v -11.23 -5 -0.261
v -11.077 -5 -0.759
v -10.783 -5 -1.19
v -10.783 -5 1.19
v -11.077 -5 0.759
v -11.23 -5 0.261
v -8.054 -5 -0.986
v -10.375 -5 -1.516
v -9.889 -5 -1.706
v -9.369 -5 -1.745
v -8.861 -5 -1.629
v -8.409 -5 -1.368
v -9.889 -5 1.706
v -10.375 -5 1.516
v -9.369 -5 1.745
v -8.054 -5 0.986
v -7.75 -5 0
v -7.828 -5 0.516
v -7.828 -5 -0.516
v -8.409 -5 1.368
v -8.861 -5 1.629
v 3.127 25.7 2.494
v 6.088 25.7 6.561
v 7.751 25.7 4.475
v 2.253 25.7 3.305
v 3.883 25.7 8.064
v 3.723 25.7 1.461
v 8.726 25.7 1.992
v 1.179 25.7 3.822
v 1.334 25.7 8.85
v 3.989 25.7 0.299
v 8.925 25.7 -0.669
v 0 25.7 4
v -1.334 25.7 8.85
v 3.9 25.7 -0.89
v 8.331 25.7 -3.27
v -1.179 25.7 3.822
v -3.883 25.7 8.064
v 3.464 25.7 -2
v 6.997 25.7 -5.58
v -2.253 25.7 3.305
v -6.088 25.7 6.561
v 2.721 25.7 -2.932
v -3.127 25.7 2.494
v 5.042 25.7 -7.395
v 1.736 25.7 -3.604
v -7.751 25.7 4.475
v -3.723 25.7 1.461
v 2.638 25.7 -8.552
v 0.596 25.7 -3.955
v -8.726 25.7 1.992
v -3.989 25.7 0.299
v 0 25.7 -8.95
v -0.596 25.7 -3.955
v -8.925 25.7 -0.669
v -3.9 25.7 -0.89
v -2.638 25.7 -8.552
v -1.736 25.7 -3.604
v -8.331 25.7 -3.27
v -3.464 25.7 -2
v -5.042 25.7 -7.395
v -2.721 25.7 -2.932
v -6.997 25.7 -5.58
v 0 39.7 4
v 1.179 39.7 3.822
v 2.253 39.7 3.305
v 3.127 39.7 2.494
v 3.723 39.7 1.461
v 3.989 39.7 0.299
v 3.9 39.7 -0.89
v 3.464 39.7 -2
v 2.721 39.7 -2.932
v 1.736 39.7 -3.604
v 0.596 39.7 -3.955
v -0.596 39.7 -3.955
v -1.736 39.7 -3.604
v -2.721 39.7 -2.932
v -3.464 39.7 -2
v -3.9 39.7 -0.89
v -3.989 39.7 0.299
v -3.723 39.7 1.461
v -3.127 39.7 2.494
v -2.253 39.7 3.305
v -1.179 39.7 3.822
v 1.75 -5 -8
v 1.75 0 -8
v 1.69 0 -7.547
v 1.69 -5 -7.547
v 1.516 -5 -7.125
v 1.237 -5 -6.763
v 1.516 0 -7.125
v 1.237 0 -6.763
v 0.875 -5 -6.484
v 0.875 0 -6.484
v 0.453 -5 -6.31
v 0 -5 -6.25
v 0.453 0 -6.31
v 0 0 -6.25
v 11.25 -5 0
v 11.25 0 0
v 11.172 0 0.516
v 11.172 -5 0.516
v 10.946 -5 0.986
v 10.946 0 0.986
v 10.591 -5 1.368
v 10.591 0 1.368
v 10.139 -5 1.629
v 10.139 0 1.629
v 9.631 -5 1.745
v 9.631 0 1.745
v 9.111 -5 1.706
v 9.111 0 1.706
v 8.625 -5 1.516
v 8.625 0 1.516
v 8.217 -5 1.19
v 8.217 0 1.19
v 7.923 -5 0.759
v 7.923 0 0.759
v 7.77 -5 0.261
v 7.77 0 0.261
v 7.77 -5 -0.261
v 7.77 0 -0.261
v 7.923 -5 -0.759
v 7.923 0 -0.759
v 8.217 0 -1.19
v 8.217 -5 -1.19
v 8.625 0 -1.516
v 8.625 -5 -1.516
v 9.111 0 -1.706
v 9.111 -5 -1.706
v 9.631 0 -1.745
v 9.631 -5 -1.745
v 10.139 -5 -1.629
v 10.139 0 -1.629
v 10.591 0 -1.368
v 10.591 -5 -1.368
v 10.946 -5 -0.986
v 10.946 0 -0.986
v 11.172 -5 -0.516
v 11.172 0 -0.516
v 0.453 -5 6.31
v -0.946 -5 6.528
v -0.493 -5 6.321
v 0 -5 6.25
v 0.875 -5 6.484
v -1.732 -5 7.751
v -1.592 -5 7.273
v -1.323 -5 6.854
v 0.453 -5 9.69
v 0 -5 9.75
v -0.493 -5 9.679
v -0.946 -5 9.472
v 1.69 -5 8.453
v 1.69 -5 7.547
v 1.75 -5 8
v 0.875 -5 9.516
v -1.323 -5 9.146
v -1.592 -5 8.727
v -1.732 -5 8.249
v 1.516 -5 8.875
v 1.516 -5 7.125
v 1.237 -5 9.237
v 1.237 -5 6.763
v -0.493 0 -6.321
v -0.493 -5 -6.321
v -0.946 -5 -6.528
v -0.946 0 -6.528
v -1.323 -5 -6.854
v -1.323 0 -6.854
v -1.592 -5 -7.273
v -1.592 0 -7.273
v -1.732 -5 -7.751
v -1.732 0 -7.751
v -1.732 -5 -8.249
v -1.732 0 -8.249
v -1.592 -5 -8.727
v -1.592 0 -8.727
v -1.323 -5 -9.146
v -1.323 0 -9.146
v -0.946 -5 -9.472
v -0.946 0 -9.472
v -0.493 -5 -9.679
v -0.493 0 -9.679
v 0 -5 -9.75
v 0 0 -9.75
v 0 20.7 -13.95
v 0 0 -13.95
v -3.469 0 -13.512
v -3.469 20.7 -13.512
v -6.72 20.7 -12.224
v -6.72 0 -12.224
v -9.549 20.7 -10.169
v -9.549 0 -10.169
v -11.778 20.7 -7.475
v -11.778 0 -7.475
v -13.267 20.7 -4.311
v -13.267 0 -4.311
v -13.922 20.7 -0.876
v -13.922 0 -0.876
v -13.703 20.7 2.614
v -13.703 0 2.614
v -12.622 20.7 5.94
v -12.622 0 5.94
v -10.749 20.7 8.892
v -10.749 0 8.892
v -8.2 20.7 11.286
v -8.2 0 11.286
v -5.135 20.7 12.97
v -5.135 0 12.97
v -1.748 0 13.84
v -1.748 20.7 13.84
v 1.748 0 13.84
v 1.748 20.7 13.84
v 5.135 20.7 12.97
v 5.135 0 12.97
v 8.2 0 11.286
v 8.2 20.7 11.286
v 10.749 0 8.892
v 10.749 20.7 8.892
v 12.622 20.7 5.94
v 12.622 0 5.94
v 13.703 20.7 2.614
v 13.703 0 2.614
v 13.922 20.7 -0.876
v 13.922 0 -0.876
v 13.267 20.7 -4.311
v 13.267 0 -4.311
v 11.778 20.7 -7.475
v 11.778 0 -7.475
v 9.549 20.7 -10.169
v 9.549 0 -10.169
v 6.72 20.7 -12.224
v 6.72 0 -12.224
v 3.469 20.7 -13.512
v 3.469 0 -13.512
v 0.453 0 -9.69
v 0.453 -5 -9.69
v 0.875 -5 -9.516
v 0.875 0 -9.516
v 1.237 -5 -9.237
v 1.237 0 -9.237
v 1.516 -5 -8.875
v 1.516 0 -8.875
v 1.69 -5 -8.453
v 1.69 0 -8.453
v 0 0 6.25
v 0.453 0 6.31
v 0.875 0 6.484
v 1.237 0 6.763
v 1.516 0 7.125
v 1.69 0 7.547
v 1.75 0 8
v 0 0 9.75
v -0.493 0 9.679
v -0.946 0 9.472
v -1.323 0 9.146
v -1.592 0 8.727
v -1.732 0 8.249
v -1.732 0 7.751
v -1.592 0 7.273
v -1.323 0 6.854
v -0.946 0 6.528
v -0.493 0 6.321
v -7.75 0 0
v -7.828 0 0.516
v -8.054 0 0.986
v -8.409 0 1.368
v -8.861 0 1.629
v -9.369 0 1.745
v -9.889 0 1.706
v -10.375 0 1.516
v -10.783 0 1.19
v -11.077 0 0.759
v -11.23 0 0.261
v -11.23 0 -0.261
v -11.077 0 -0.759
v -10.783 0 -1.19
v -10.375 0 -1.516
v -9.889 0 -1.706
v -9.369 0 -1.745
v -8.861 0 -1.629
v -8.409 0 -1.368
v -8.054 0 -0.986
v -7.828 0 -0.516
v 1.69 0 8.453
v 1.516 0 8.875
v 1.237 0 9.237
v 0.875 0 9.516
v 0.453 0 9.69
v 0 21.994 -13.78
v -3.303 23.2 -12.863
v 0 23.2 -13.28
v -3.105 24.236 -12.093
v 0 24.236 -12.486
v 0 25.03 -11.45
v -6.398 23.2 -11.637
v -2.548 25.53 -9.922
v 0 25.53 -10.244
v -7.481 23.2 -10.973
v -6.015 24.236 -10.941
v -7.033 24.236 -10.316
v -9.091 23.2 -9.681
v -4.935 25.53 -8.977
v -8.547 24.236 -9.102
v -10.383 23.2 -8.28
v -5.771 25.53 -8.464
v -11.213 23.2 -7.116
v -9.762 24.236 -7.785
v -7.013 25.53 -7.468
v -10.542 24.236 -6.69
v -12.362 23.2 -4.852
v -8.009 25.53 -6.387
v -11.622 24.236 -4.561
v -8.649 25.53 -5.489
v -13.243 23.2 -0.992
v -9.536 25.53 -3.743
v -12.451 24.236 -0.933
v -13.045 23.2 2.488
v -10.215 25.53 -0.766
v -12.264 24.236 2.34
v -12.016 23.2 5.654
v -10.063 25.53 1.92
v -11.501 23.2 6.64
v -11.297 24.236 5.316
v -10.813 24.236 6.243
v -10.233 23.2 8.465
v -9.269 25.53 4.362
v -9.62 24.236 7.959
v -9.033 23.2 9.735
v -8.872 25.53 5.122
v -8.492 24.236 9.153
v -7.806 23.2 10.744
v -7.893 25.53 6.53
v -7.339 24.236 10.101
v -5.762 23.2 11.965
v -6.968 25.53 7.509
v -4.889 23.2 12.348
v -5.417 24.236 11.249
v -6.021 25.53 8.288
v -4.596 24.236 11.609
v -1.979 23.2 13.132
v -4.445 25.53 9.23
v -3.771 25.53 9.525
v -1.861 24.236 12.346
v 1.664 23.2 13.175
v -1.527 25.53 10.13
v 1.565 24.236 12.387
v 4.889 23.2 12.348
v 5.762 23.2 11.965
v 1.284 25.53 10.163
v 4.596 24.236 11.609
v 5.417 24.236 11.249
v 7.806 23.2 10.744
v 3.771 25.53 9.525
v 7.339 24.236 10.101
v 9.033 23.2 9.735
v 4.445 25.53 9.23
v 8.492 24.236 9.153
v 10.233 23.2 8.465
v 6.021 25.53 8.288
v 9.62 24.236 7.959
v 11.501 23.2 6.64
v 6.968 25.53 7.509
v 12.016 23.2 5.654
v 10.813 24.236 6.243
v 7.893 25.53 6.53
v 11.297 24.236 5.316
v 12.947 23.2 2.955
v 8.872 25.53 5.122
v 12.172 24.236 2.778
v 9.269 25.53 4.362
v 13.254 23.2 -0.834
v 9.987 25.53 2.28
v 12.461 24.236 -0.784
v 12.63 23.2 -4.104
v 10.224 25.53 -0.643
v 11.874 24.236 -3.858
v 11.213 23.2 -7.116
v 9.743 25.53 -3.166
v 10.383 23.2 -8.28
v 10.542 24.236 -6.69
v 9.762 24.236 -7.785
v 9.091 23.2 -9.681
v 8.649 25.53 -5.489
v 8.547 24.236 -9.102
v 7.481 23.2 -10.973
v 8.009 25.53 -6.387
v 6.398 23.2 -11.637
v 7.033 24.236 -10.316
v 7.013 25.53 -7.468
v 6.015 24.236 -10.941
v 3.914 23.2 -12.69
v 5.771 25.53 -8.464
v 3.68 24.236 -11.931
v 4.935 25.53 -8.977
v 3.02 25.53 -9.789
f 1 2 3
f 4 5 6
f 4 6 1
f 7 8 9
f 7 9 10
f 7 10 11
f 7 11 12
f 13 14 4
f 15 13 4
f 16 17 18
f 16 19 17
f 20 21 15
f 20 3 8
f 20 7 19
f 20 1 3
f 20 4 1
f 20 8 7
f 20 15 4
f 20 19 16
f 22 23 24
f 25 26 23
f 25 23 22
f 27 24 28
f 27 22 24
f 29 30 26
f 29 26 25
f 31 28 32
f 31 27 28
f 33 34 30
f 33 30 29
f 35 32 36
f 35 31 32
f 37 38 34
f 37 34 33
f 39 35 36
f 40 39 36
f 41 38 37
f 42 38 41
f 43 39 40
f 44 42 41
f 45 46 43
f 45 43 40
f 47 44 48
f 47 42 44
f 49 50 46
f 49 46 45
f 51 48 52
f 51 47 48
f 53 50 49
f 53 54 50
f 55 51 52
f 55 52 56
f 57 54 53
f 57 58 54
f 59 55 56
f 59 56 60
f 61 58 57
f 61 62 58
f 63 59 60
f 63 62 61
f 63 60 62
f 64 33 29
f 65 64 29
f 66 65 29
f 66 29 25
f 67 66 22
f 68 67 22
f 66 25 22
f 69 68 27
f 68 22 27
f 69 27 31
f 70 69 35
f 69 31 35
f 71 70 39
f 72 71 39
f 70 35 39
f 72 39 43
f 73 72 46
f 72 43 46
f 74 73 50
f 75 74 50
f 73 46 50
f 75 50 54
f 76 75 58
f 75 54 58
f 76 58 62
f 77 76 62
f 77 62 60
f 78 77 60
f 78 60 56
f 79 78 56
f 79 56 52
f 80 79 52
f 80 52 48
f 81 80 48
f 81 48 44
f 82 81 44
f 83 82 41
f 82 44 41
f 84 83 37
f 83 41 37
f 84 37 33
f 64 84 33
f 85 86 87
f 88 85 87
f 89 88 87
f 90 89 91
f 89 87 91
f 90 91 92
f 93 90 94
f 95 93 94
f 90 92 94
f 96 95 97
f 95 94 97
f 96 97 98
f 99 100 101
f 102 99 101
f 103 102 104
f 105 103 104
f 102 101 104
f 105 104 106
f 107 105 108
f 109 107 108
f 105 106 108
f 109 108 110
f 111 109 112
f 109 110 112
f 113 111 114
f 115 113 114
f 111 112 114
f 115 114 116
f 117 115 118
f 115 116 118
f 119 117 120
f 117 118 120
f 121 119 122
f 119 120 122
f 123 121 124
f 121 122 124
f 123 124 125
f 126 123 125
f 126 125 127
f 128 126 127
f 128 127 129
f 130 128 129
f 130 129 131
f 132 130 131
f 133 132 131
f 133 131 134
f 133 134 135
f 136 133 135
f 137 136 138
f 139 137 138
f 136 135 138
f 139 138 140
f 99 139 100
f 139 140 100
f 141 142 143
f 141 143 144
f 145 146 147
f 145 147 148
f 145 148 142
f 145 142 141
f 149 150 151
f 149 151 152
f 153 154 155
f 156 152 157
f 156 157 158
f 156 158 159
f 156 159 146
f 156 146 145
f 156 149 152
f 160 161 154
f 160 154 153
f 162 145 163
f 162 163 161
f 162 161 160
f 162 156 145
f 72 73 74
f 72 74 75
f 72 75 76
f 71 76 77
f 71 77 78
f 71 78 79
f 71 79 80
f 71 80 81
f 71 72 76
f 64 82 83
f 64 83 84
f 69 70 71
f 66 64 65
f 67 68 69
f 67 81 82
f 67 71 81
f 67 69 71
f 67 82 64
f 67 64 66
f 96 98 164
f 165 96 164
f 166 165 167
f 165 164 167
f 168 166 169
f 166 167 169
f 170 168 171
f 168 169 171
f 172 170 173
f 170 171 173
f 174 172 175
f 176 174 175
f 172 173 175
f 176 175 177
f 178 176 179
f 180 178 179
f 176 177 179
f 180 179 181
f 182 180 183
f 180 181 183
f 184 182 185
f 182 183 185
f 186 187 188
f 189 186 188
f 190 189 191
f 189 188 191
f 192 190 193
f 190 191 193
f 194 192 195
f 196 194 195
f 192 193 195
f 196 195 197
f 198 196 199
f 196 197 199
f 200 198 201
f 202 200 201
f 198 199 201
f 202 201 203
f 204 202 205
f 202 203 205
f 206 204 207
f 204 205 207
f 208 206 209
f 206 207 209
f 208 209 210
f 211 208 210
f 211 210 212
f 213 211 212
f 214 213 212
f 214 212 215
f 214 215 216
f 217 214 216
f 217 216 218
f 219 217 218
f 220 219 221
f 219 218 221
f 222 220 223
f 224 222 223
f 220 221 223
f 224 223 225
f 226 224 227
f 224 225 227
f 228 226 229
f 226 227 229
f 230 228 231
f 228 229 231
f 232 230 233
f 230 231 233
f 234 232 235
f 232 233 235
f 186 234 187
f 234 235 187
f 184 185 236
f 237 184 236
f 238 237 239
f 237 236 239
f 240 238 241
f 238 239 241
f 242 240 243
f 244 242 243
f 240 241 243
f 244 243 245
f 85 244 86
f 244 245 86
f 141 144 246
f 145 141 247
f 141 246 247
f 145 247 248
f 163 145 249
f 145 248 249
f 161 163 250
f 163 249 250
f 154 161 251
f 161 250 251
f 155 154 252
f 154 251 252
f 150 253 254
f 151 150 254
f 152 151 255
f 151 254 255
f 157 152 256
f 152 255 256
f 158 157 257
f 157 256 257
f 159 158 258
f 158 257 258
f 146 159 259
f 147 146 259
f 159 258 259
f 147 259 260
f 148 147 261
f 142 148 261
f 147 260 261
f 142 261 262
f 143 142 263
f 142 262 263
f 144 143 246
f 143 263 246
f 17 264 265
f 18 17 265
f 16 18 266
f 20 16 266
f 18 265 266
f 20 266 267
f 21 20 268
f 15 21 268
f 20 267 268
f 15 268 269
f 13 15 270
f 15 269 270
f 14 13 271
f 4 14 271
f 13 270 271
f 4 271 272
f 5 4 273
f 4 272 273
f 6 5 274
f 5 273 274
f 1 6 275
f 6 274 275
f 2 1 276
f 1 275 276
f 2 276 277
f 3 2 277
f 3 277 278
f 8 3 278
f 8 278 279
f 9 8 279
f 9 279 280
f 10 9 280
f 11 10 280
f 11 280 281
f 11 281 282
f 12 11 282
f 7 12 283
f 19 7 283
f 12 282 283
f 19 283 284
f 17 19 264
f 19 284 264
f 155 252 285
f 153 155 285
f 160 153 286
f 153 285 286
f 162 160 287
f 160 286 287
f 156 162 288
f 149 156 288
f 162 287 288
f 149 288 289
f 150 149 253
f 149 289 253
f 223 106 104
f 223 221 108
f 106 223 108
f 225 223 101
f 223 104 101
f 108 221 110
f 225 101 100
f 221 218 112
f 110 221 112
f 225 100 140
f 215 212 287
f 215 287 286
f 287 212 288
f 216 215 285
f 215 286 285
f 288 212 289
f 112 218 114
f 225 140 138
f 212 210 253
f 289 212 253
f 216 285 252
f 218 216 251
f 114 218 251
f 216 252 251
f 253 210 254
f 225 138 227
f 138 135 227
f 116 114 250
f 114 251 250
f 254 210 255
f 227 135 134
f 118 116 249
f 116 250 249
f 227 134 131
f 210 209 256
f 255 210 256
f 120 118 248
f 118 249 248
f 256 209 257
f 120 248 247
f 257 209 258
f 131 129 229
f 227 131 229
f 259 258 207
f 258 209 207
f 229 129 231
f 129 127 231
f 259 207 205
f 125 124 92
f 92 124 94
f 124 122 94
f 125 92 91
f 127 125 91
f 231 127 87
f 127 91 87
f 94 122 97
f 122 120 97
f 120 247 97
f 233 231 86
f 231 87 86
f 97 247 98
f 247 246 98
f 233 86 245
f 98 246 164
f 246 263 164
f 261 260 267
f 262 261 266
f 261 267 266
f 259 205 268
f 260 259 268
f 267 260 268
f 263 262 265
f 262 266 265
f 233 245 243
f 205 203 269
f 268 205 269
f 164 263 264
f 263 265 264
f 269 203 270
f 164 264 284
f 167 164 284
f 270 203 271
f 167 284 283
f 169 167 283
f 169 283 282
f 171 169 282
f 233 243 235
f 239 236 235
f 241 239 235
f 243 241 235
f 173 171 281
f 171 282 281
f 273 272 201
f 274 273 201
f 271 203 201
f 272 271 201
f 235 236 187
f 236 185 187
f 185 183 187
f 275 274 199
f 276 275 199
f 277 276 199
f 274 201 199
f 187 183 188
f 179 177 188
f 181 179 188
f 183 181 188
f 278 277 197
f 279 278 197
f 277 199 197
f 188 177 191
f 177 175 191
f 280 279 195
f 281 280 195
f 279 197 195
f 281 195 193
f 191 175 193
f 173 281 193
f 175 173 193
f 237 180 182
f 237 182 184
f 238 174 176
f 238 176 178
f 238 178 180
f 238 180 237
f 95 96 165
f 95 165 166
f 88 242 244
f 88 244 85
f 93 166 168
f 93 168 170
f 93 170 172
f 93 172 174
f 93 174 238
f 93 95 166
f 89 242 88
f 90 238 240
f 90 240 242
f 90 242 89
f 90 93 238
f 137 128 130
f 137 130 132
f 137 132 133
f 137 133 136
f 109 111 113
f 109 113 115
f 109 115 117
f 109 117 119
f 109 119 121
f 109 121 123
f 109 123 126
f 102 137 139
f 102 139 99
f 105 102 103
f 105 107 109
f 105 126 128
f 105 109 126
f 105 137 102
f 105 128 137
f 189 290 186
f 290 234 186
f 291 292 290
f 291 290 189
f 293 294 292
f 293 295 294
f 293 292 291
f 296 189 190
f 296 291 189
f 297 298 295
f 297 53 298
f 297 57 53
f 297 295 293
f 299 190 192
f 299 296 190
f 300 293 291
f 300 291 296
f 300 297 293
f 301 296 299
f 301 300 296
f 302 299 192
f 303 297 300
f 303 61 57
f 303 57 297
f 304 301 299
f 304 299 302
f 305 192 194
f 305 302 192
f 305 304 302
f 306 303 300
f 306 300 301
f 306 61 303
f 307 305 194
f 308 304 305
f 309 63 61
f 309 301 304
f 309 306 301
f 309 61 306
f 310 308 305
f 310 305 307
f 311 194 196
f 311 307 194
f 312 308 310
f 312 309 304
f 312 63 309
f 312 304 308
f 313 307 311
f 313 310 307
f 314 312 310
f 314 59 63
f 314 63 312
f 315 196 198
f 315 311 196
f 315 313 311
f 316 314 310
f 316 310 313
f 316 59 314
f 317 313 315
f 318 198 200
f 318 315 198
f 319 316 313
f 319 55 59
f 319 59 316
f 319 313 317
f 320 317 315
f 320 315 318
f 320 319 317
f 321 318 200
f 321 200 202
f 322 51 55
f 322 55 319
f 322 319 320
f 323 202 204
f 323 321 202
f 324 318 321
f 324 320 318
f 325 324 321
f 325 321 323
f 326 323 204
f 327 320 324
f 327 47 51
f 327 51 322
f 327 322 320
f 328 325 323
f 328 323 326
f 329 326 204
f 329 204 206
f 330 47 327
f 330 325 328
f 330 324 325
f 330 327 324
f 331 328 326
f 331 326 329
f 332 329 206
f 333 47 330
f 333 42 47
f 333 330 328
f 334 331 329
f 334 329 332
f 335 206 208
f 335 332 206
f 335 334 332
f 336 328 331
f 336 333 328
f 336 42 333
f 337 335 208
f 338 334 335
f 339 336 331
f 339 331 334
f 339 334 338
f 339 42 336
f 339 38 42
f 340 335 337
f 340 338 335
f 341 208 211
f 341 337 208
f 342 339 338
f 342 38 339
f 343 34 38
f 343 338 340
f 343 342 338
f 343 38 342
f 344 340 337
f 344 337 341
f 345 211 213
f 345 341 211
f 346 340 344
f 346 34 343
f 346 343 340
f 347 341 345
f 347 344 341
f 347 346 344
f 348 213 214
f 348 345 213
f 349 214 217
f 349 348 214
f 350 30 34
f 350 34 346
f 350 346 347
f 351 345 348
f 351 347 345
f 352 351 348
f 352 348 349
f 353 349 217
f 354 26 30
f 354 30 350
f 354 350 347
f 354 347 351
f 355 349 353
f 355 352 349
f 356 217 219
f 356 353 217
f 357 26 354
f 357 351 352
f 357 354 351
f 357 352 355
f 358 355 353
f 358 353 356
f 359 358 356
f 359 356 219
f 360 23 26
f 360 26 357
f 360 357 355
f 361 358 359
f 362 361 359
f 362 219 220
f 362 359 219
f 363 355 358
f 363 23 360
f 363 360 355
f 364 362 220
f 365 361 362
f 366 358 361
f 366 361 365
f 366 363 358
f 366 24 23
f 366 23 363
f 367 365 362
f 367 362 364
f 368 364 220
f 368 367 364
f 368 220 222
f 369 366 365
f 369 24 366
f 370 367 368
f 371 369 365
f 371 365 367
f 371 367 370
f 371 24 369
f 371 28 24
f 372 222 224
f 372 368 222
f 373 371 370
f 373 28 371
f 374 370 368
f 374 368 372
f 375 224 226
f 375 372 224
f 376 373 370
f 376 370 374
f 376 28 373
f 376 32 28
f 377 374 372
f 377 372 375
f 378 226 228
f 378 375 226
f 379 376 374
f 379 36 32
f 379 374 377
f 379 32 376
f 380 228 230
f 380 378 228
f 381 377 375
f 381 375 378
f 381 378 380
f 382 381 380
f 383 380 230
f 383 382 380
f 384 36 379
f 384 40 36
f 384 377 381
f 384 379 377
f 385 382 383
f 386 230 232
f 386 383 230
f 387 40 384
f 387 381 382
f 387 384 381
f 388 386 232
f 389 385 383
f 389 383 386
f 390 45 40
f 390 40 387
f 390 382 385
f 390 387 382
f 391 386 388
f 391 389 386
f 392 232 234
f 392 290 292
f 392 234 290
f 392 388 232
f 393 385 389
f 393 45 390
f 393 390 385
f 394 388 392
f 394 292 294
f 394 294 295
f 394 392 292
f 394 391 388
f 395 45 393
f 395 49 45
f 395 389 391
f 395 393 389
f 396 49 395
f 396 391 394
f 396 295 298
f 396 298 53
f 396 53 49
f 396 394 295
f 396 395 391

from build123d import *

# Parameters (mm, degrees)
SKETCH1_R           = 13.95
BOSS_EXTRUDE1_DEPTH = 25.7
FILLET1_R           = 5
SKETCH2_R           = 4
BOSS_EXTRUDE2_DEPTH = 14
BOSS_EXTRUDE3_DEPTH = 5


with BuildPart() as part:
    # Sketch1 → Boss-Extrude1 (new body)
    with BuildSketch(Plane(origin=(0, 0, 0), x_dir=(1, 0, 0), z_dir=(0, 1, 0))):
        with Locations(Location((0, 0, 0), (0, 0, 90))):
            Circle(SKETCH1_R)
    extrude(amount=BOSS_EXTRUDE1_DEPTH)

    # Fillet1
    fillet1_edges = [part.edges().sort_by_distance(p)[0] for p in [
        (0, 25.7, 13.95),
    ]]
    fillet(fillet1_edges, radius=FILLET1_R)

    # Sketch2 → Boss-Extrude2 (add)
    with BuildSketch(Plane(origin=(0, 25.7, 0), x_dir=(1, 0, 0), z_dir=(0, 1, 0))):
        with Locations(Location((0, 0, 0), (0, 0, 270))):
            Circle(SKETCH2_R)
    extrude(amount=BOSS_EXTRUDE2_DEPTH)

    # Sketch3 → Boss-Extrude3 (add)
    with BuildSketch(Plane.XZ):
        with BuildLine():
            ThreePointArc((0, 9.75), (-1.75, 8), (0, 6.25))
            Line((0, 6.25), (0, 9.75))
        make_face()
        with BuildLine():
            Line((0, 9.75), (0, 6.25))
            ThreePointArc((0, 6.25), (1.237436867, 6.762563133), (1.75, 8))
            ThreePointArc((1.75, 8), (1.237436867, 9.237436867), (0, 9.75))
        make_face()
        with BuildLine():
            ThreePointArc((-11.25, 0), (-9.5, -1.75), (-7.75, 0))
            Line((-7.75, 0), (-11.25, 0))
        make_face()
        with BuildLine():
            Line((-11.25, 0), (-7.75, 0))
            ThreePointArc((-7.75, 0), (-9.5, 1.75), (-11.25, 0))
        make_face()
        with BuildLine():
            ThreePointArc((1.75, -8), (1.237436867, -6.762563133), (0, -6.25))
            Line((0, -6.25), (0, -9.75))
            ThreePointArc((0, -9.75), (1.237436867, -9.237436867), (1.75, -8))
        make_face()
        with BuildLine():
            Line((0, -9.75), (0, -6.25))
            ThreePointArc((0, -6.25), (-1.75, -8), (0, -9.75))
        make_face()
        with BuildLine():
            ThreePointArc((7.75, 0), (9.5, -1.75), (11.25, 0))
            Line((11.25, 0), (7.75, 0))
        make_face()
        with BuildLine():
            Line((7.75, 0), (11.25, 0))
            ThreePointArc((11.25, 0), (9.5, 1.75), (7.75, 0))
        make_face()
    extrude(amount=BOSS_EXTRUDE3_DEPTH)


solid = part.part
